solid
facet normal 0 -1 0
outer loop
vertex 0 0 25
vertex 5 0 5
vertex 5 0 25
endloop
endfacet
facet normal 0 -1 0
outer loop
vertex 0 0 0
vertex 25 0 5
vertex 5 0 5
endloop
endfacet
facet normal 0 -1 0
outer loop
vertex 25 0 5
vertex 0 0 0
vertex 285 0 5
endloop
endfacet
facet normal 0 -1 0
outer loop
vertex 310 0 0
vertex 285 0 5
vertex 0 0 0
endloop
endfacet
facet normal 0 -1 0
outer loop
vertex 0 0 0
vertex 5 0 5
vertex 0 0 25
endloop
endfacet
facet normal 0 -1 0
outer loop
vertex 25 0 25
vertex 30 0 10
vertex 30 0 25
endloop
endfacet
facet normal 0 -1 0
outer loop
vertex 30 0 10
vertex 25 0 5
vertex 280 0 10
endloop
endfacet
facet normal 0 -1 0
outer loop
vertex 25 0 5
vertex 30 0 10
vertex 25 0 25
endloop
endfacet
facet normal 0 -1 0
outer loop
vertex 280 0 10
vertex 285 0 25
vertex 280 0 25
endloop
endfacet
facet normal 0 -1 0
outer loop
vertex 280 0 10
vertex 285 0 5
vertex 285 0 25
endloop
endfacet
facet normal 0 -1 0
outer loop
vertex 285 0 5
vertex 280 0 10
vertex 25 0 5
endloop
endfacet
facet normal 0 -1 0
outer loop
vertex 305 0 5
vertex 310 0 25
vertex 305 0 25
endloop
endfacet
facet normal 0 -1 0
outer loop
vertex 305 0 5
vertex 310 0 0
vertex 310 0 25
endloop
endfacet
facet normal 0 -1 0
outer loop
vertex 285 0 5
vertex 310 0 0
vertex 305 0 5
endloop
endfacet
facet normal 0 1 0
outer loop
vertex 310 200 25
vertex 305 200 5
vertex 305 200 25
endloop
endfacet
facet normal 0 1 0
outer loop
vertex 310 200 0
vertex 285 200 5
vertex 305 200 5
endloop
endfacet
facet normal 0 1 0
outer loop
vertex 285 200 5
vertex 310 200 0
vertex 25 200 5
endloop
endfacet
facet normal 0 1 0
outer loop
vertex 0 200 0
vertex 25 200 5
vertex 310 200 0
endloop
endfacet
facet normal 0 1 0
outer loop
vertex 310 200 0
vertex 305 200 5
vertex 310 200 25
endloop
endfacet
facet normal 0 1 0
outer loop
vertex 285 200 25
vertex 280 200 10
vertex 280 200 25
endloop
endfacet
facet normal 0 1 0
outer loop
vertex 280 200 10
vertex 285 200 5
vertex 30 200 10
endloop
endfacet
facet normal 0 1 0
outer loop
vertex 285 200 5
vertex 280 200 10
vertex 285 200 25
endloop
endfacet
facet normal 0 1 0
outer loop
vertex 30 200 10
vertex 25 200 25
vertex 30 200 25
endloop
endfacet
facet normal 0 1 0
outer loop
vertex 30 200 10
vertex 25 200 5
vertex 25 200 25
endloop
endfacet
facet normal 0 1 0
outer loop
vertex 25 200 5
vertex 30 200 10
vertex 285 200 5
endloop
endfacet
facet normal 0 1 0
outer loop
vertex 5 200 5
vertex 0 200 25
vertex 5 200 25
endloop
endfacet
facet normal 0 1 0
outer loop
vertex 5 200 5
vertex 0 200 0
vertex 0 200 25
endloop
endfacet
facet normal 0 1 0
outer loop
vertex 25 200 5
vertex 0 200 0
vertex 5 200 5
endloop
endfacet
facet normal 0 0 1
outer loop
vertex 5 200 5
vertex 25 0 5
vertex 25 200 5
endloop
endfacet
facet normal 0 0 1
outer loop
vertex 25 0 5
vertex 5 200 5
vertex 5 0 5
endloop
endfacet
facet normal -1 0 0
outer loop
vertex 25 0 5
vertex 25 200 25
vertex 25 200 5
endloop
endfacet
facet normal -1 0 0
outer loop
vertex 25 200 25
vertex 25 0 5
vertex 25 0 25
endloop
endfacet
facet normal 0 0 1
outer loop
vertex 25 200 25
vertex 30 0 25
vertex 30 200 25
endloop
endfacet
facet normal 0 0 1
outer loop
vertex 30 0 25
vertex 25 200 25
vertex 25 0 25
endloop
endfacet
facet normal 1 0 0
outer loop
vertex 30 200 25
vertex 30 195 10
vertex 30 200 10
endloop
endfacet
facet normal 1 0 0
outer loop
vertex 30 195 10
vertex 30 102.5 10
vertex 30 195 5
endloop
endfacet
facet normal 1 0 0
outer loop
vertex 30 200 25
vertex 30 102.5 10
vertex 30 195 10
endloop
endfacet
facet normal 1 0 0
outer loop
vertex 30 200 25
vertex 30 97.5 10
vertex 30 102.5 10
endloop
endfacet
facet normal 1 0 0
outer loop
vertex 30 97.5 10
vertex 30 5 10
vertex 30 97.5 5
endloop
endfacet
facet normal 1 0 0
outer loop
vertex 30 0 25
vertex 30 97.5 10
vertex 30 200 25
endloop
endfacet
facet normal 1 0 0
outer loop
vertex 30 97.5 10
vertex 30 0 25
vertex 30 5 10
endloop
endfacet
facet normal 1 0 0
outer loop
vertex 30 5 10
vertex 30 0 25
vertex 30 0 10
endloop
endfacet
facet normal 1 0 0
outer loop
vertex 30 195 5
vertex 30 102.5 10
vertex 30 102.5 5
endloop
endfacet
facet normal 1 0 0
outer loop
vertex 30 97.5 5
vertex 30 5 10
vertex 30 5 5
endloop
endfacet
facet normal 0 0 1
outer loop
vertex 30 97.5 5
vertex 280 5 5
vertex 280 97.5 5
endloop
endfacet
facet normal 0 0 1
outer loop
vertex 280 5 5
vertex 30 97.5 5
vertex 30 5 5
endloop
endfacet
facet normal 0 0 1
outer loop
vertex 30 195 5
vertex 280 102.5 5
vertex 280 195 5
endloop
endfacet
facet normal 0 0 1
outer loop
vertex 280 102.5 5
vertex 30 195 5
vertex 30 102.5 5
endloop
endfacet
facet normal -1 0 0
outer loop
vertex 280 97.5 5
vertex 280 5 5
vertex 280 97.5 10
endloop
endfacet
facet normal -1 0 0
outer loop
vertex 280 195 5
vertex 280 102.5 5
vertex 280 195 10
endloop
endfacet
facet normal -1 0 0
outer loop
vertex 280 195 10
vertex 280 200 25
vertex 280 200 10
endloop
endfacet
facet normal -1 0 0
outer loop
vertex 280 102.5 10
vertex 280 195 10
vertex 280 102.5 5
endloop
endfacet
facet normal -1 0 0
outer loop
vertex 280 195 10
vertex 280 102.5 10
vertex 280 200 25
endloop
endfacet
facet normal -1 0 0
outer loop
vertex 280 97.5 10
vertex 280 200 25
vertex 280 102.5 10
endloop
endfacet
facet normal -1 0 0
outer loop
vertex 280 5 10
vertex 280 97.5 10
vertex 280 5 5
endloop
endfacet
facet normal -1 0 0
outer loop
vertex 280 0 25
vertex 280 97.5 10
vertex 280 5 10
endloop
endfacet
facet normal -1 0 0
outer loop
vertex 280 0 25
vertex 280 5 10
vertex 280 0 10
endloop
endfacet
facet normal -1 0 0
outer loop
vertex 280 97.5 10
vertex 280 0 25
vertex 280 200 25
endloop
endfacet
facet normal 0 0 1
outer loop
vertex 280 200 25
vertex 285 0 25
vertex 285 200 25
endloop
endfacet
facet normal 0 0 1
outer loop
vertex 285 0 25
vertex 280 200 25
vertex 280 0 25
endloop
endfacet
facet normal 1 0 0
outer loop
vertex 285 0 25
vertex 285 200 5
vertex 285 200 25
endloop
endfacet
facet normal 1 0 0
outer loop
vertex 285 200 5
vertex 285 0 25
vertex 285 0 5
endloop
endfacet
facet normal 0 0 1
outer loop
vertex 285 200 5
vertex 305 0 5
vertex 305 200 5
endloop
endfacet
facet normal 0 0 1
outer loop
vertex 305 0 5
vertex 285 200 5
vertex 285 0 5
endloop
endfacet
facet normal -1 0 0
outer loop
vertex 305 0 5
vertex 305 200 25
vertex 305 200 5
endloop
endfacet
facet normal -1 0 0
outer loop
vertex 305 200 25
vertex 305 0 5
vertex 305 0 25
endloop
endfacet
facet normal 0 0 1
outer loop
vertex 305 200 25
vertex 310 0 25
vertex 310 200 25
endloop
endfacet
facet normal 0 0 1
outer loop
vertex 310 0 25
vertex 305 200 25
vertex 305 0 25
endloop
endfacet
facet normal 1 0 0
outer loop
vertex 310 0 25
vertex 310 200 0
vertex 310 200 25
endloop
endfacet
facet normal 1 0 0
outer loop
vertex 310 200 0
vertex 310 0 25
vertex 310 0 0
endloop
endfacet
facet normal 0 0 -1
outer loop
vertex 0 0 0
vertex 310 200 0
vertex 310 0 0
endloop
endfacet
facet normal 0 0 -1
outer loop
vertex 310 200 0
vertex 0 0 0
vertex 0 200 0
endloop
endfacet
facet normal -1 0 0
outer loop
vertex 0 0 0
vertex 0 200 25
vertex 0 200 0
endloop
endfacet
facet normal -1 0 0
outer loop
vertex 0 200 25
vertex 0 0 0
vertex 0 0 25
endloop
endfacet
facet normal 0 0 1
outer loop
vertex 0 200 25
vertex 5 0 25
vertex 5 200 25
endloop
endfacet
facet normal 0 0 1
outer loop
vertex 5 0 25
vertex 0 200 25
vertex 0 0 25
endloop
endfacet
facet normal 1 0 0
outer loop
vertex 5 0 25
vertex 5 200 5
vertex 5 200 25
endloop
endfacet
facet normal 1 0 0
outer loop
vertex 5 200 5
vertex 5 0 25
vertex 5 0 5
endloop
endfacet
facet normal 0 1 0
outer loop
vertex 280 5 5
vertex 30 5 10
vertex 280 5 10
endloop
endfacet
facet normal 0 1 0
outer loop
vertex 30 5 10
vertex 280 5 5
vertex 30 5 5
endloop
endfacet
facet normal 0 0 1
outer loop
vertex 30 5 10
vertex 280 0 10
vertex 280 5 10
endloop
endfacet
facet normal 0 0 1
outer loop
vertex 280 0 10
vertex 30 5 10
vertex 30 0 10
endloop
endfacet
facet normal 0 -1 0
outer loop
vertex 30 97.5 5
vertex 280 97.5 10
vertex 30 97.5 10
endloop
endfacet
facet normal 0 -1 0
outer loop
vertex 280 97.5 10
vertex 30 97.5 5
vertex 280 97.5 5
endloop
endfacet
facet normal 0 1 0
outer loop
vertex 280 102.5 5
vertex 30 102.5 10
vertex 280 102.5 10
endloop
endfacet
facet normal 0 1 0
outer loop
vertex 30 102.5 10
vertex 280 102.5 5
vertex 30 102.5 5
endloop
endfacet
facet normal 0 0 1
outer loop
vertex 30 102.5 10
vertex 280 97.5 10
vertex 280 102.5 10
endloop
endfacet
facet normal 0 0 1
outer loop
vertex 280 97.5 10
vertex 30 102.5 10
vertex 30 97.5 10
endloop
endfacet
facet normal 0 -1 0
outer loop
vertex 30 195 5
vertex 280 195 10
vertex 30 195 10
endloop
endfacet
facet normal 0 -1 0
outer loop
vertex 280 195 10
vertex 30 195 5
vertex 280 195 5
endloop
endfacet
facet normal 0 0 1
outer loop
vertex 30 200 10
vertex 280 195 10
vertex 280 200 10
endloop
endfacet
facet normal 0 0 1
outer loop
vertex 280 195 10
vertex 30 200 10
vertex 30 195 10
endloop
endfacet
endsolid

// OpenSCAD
length = 200;

rotate([270, 0, 0])
translate([0, -25, 0]) {
    linear_extrude(height=length)
    polygon(points=[
        [0, 0],
        [0, 25],
        [310, 25],
        [310, 0],
        [305, 0],
        [305, 20],
        [285, 20],
        [285, 0],
        [280, 0],
        [280, 20],
        [30, 20],
        [30, 0],
        [25, 0],
        [25, 20],
        [5, 20],
        [5, 0],
        [0, 0],
        [0, 0]
    ]);

    translate([0, 0, 0]) brace();
    translate([0, 0, (length-5)/2]) brace();
    translate([0, 0, length-5]) brace();
}

module brace() {
    linear_extrude(height=5)
        polygon(points=[
        [0, 0],
        [0, 25],
        [310, 25],
        [310, 0],
        [305, 0],
        [305, 20],
        [285, 20],
        [285, 0],
        [280, 0],
        [280, 15],
        [30, 15],
        [30, 0],
        [25, 0],
        [25, 20],
        [5, 20],
        [5, 0],
        [0, 0],
        [0, 0]
    ]);
}
